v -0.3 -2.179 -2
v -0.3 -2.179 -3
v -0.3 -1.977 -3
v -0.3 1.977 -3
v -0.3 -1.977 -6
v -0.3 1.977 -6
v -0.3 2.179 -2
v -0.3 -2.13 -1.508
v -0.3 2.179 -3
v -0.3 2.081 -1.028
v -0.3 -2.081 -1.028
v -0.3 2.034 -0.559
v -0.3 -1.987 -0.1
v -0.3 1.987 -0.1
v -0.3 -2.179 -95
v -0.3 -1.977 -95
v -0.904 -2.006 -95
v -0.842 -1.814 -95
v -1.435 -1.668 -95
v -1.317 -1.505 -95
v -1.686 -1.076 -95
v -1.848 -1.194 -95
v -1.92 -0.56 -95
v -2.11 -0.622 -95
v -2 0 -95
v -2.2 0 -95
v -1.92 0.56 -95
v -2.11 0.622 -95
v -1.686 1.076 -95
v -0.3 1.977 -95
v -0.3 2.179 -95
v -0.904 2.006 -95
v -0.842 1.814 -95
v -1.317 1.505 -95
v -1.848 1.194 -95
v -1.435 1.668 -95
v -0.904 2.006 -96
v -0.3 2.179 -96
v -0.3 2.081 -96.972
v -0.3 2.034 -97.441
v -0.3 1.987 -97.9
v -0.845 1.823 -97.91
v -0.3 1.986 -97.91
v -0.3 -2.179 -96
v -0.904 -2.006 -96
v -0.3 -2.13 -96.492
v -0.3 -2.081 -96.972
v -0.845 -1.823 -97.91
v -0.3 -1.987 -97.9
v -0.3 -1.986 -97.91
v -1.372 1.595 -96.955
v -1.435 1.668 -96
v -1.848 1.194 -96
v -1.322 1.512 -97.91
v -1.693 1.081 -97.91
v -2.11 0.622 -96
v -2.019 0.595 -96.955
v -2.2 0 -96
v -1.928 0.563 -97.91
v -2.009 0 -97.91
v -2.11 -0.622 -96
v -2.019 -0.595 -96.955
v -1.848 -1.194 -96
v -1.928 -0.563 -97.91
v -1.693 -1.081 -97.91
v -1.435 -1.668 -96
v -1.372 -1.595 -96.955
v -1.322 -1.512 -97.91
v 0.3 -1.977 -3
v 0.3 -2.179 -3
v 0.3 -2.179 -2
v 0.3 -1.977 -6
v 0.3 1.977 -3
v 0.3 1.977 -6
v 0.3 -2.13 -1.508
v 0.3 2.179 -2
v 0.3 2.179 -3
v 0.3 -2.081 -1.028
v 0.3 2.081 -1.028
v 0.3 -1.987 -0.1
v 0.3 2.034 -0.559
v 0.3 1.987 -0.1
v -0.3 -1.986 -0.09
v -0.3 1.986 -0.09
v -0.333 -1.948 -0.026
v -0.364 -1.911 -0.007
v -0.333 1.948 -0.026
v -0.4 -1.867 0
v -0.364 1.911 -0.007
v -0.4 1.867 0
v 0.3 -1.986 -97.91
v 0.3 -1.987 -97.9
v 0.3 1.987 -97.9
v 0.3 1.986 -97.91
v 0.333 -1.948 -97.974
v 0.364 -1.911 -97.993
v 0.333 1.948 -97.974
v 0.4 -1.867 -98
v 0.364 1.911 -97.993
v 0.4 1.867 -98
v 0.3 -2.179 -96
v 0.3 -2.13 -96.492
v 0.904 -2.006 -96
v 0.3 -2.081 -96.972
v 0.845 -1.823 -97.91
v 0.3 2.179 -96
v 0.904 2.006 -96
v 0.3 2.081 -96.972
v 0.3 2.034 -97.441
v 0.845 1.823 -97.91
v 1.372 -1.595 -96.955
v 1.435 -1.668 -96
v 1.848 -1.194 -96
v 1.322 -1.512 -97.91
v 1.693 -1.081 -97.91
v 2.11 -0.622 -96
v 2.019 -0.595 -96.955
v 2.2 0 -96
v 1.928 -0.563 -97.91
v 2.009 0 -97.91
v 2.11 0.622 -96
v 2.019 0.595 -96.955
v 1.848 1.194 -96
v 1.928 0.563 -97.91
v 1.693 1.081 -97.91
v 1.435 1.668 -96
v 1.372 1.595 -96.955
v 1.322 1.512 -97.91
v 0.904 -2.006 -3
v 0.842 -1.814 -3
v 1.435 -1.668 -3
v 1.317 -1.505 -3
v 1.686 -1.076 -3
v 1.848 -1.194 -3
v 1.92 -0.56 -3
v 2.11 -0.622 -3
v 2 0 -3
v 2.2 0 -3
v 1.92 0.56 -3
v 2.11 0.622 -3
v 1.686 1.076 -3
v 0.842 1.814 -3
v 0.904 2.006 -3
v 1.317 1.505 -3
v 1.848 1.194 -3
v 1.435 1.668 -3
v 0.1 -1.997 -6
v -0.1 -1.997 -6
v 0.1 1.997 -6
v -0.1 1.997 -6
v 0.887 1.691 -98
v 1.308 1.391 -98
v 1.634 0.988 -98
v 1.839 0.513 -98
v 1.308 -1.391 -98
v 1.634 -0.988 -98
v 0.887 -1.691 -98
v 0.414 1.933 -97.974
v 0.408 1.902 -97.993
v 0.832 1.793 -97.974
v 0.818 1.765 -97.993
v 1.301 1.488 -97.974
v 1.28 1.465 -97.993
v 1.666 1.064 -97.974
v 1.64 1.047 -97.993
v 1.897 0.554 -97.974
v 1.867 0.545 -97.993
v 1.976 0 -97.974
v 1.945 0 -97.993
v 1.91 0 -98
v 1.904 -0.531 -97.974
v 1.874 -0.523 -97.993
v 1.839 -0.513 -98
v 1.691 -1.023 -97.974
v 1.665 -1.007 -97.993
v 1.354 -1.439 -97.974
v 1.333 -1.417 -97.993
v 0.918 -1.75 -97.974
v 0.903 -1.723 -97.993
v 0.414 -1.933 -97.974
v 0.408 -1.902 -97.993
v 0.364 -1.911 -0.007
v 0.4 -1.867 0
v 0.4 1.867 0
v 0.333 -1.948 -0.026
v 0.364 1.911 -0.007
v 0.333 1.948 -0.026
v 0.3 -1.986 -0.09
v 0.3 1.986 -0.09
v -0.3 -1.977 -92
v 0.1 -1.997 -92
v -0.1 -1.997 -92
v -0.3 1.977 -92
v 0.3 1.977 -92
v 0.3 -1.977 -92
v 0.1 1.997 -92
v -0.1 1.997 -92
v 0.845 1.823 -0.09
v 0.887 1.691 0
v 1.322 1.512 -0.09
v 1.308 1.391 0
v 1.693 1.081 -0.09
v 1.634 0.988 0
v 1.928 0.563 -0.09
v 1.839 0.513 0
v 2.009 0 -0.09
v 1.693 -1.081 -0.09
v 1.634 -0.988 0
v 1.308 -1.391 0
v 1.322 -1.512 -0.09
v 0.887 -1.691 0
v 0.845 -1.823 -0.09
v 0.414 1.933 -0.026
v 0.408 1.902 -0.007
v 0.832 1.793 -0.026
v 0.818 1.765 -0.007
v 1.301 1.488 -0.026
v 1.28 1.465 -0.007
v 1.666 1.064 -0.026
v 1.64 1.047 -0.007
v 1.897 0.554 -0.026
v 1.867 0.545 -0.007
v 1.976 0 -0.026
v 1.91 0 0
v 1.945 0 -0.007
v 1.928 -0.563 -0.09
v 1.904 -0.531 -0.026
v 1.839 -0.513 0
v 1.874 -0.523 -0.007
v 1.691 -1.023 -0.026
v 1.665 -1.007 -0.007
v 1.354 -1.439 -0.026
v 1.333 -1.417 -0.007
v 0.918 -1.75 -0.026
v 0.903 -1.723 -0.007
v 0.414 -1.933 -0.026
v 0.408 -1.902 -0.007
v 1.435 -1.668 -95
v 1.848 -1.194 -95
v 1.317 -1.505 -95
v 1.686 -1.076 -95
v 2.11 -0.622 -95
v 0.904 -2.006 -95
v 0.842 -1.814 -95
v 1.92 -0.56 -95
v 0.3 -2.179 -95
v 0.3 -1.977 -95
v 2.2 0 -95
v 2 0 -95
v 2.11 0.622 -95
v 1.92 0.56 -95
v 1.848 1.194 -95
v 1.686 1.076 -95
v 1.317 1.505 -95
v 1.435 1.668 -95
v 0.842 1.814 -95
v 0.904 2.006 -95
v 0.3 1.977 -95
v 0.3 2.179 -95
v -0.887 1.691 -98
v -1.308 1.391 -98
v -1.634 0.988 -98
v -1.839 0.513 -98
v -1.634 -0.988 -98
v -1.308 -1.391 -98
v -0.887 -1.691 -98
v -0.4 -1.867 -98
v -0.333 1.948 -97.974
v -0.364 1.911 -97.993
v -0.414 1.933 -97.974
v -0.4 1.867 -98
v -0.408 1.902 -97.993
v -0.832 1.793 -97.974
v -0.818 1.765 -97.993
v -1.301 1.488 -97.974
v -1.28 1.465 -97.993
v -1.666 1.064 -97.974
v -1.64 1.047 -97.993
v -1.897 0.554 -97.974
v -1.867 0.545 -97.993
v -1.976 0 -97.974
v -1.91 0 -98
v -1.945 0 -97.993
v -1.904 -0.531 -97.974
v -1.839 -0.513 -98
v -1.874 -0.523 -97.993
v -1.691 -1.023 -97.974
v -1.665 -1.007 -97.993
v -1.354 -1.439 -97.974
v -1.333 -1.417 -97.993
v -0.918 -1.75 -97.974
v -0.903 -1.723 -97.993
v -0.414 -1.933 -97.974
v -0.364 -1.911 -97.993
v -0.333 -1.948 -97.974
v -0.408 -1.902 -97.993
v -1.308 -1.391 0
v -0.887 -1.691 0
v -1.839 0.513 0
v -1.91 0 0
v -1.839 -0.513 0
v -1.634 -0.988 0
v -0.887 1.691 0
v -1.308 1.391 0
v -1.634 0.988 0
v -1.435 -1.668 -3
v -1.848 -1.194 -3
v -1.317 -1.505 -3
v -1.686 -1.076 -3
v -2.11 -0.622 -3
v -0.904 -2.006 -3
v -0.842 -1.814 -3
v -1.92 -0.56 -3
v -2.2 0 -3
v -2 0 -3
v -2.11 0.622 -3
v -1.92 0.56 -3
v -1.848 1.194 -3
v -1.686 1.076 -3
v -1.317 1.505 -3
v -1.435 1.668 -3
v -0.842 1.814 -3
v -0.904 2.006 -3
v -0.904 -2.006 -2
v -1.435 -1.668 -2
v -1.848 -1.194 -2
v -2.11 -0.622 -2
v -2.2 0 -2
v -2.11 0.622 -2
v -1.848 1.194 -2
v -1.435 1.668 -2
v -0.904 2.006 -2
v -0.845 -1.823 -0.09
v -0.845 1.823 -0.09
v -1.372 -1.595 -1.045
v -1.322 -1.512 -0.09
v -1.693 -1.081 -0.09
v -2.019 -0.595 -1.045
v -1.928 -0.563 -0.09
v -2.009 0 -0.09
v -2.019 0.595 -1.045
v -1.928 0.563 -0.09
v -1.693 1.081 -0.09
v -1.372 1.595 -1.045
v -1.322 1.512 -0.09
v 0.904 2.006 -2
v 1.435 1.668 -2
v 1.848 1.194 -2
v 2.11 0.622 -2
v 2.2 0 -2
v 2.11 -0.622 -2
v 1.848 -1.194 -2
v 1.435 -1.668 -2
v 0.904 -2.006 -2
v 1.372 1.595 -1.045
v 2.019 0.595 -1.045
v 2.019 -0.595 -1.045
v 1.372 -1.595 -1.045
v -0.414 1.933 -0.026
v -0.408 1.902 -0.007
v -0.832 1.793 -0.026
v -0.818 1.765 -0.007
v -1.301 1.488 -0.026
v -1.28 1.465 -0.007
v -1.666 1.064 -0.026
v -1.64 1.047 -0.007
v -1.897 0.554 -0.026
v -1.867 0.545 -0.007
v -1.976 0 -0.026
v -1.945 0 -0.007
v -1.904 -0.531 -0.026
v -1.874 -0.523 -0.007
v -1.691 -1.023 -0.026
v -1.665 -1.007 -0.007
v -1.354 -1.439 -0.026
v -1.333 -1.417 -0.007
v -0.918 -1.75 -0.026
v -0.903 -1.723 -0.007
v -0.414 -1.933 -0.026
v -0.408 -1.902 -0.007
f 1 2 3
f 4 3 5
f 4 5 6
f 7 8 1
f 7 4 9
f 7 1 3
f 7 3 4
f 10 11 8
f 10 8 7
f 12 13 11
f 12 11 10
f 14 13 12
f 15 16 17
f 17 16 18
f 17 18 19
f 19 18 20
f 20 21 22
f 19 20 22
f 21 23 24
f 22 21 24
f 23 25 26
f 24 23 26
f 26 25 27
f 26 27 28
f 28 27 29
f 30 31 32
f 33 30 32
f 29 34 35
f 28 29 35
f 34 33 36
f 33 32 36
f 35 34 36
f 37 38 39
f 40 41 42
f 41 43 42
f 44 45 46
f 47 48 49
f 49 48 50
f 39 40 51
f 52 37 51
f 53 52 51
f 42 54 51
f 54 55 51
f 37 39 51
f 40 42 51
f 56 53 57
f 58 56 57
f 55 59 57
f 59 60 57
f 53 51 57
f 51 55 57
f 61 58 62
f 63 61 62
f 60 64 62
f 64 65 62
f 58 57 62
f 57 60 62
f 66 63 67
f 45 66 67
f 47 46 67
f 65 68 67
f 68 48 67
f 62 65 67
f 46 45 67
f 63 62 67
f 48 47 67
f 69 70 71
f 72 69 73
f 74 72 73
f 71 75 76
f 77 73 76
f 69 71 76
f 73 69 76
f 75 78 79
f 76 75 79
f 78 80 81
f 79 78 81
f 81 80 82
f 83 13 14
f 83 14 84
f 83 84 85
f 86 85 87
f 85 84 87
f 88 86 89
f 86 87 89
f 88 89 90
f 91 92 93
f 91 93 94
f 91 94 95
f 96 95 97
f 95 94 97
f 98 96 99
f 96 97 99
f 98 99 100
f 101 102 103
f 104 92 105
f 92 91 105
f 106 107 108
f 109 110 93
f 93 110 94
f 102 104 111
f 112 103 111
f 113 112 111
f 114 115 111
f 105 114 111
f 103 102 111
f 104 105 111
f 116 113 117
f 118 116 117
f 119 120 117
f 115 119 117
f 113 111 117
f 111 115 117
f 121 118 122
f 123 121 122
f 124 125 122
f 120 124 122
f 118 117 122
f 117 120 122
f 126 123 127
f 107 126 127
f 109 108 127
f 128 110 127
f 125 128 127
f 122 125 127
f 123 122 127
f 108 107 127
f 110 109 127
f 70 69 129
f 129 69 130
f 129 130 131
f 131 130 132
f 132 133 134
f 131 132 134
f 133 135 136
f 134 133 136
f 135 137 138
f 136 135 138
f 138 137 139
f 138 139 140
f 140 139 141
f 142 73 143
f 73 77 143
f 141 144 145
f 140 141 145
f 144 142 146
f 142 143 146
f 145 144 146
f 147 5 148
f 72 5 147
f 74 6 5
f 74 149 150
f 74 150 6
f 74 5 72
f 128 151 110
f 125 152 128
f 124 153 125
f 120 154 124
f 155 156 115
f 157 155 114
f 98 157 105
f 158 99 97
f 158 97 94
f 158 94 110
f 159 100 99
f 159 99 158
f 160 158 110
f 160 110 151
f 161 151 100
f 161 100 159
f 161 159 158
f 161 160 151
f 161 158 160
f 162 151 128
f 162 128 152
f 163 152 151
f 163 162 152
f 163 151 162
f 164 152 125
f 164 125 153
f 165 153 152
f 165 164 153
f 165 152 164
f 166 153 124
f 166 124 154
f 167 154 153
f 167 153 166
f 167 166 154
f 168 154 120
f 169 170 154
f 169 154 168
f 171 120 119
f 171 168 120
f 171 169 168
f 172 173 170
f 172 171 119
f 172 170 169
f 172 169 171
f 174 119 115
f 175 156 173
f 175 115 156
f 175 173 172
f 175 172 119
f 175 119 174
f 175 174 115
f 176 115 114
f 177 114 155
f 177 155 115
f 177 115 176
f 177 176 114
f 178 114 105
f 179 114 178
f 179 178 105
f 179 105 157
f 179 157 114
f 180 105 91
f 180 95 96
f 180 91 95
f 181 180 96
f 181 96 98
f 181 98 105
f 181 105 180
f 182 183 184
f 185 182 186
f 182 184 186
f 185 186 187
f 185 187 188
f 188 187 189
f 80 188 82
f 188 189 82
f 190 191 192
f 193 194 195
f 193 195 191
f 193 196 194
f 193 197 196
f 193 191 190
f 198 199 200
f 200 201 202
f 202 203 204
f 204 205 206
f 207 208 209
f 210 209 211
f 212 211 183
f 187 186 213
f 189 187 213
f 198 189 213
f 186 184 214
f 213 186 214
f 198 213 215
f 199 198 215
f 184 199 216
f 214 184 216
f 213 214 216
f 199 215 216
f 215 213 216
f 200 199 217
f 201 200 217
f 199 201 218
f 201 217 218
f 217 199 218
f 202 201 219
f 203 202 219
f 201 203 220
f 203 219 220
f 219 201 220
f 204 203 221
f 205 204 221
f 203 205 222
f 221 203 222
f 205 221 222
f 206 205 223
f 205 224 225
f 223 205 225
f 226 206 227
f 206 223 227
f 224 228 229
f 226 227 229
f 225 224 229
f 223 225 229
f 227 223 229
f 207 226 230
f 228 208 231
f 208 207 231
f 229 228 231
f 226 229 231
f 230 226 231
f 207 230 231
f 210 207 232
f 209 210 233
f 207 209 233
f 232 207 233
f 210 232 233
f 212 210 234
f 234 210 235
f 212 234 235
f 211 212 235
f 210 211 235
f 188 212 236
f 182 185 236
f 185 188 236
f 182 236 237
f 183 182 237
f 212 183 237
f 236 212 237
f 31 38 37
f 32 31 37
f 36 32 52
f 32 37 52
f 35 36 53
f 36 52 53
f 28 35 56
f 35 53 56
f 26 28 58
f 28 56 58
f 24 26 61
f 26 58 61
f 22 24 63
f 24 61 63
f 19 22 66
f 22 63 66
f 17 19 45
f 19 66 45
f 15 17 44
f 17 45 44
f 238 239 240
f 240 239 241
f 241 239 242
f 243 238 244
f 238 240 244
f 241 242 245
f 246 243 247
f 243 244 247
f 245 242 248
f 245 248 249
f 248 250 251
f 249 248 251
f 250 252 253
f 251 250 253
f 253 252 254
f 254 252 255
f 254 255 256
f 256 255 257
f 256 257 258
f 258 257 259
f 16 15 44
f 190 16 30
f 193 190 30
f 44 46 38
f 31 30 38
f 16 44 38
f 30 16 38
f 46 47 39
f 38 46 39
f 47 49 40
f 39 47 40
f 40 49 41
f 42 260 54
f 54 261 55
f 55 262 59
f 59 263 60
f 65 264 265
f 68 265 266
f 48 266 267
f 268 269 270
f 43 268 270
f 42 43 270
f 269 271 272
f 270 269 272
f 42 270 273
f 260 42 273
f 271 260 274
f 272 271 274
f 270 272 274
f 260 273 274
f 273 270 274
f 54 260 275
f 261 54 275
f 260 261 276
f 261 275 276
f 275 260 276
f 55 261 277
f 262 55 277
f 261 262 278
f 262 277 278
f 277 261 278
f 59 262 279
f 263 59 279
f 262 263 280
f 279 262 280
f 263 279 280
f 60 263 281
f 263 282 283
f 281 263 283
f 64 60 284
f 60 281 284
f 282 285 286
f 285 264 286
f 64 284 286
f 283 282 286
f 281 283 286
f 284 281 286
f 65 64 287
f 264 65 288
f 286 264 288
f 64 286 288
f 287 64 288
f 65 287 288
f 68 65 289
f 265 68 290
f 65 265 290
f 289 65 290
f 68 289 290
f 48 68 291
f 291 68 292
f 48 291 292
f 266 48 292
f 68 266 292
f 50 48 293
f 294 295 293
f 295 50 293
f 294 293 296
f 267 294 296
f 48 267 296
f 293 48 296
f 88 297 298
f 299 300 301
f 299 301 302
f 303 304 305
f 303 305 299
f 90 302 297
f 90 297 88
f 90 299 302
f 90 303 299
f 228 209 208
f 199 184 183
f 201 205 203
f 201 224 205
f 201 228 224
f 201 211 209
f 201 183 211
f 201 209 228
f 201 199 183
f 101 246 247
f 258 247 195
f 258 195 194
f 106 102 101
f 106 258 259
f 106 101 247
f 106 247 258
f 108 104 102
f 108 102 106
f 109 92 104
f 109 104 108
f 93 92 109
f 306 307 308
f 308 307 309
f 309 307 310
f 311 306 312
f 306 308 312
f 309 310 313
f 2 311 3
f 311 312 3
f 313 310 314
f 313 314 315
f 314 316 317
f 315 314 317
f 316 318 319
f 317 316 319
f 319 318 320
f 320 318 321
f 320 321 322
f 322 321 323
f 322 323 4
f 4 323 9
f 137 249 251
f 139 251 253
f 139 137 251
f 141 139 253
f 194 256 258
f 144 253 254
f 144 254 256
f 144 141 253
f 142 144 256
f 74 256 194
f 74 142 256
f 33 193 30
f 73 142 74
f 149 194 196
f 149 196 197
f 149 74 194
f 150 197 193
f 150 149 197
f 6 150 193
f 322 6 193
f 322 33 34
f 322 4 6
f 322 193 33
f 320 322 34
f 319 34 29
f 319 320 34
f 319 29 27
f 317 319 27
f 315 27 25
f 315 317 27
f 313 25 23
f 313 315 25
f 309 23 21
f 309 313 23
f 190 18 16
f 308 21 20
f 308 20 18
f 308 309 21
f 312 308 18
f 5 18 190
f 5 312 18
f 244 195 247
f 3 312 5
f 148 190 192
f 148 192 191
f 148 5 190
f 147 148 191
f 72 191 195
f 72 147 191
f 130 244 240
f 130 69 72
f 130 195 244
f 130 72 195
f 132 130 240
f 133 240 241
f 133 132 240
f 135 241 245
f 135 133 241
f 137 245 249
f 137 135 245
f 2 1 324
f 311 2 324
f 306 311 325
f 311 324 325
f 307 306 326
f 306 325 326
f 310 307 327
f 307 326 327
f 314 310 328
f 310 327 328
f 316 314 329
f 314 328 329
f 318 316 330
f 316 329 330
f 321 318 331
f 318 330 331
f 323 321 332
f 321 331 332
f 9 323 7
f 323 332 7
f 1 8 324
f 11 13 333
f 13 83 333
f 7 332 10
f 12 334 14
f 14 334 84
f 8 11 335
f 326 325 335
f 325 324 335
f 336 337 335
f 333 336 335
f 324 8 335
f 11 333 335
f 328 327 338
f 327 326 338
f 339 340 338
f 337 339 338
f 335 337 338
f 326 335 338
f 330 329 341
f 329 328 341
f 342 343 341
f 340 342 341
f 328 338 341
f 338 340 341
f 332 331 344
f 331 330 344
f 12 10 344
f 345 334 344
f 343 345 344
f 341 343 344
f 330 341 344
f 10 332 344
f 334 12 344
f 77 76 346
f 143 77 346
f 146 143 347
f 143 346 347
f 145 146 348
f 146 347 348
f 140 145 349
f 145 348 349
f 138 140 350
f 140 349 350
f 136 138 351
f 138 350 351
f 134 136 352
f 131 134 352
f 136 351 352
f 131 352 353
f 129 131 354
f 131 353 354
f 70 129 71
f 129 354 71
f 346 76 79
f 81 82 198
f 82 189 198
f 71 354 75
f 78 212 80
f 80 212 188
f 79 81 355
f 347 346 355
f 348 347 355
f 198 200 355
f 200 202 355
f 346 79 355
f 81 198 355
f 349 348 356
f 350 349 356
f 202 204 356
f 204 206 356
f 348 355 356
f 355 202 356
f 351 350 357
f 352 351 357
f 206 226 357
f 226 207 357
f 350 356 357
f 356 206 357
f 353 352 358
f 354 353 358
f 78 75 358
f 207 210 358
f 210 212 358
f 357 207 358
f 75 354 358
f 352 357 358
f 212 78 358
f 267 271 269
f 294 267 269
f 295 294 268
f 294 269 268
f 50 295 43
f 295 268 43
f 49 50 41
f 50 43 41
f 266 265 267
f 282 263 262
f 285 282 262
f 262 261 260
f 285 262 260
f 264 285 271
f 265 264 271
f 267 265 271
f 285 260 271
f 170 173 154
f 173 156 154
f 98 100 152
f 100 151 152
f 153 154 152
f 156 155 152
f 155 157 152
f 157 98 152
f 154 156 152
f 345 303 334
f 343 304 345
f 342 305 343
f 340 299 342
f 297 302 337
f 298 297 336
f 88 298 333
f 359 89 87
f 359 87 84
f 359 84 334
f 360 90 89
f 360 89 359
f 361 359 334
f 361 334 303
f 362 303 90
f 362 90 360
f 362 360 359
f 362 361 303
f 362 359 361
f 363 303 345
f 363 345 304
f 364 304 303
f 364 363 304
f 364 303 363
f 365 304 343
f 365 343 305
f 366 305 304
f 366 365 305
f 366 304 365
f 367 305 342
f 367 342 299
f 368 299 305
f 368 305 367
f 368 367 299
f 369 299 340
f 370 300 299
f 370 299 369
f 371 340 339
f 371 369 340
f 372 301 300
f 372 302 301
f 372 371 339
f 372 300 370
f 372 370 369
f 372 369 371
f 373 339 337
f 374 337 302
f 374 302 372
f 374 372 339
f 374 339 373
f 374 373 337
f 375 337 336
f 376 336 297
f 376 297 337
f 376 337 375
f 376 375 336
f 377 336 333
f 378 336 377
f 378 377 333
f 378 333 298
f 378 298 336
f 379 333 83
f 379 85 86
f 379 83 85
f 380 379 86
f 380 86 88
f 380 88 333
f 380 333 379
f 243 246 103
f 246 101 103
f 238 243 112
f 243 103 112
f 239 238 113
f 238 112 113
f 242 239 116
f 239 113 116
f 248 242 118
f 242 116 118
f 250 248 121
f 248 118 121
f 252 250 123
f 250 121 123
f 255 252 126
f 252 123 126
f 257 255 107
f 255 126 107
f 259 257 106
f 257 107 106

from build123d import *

# Parameters (mm, degrees)
SKETCH_1_R          = 2
EXTRUDE_1_DEPTH     = 98
SKETCH_4_W          = 0.6
SKETCH_4_H          = 4.591769547
CUT_EXTRUDE_1_DEPTH = 6
SKETCH_5_W          = 0.6
SKETCH_5_H          = 4.626337449
CUT_EXTRUDE_2_DEPTH = 6
FILLET_1_R          = 0.1


with BuildPart() as part:
    # 草图1 → 凸台-拉伸1 (new body)
    with BuildSketch(Plane.XY):
        Circle(SKETCH_1_R)
    extrude(amount=-EXTRUDE_1_DEPTH)

    # 草图2 → 旋转1 (revolve)
    with BuildSketch(Plane(origin=(0, 0, 0), x_dir=(1, 0, 0), z_dir=(0, 1, 0))):
        Polygon((2, 98), (2, 95), (2.2, 95), (2.2, 96), align=None)
    revolve(axis=Axis((0, 0, -98.400889699), (0, 0, 1)))

    # 草图3 → 旋转2 (revolve)
    with BuildSketch(Plane(origin=(0, 0, 0), x_dir=(1, 0, 0), z_dir=(0, 1, 0)), mode=Mode.PRIVATE) as revolve_2_sk:
        Polygon((2, 0), (2, 3), (2.2, 3), (2.2, 2), align=None)
    revolve(revolve_2_sk.sketch.rotate(Axis((0, 0, 0.764121939), (0, 0, -1)), 180), axis=Axis((0, 0, 0.764121939), (0, 0, -1)))

    # 草图4 → 切除-拉伸1 (cut)
    with BuildSketch(Plane.XY):
        with Locations((0, -0.031687242)):
            Rectangle(SKETCH_4_W, SKETCH_4_H)
    extrude(amount=-CUT_EXTRUDE_1_DEPTH, mode=Mode.SUBTRACT)

    # 草图5 → 切除-拉伸2 (cut)
    with BuildSketch(Plane(origin=(0, 0, -98), x_dir=(-1, 0, 0), z_dir=(0, 0, -1))):
        with Locations((0, -0.054732511)):
            Rectangle(SKETCH_5_W, SKETCH_5_H)
    extrude(amount=-CUT_EXTRUDE_2_DEPTH, mode=Mode.SUBTRACT)

    # 圆角1
    fillet_1_edges = [part.edges().sort_by_distance(p)[0] for p in [
        (0.3, 0, -98),
        (2, 0, -98),
        (-0.3, 0, -98),
        (-2, 0, -98),
        (-2, 0, 0),
        (-0.3, 0, 0),
        (2, 0, 0),
        (0.3, 0, 0),
    ]]
    fillet(fillet_1_edges, radius=FILLET_1_R)


solid = part.part
